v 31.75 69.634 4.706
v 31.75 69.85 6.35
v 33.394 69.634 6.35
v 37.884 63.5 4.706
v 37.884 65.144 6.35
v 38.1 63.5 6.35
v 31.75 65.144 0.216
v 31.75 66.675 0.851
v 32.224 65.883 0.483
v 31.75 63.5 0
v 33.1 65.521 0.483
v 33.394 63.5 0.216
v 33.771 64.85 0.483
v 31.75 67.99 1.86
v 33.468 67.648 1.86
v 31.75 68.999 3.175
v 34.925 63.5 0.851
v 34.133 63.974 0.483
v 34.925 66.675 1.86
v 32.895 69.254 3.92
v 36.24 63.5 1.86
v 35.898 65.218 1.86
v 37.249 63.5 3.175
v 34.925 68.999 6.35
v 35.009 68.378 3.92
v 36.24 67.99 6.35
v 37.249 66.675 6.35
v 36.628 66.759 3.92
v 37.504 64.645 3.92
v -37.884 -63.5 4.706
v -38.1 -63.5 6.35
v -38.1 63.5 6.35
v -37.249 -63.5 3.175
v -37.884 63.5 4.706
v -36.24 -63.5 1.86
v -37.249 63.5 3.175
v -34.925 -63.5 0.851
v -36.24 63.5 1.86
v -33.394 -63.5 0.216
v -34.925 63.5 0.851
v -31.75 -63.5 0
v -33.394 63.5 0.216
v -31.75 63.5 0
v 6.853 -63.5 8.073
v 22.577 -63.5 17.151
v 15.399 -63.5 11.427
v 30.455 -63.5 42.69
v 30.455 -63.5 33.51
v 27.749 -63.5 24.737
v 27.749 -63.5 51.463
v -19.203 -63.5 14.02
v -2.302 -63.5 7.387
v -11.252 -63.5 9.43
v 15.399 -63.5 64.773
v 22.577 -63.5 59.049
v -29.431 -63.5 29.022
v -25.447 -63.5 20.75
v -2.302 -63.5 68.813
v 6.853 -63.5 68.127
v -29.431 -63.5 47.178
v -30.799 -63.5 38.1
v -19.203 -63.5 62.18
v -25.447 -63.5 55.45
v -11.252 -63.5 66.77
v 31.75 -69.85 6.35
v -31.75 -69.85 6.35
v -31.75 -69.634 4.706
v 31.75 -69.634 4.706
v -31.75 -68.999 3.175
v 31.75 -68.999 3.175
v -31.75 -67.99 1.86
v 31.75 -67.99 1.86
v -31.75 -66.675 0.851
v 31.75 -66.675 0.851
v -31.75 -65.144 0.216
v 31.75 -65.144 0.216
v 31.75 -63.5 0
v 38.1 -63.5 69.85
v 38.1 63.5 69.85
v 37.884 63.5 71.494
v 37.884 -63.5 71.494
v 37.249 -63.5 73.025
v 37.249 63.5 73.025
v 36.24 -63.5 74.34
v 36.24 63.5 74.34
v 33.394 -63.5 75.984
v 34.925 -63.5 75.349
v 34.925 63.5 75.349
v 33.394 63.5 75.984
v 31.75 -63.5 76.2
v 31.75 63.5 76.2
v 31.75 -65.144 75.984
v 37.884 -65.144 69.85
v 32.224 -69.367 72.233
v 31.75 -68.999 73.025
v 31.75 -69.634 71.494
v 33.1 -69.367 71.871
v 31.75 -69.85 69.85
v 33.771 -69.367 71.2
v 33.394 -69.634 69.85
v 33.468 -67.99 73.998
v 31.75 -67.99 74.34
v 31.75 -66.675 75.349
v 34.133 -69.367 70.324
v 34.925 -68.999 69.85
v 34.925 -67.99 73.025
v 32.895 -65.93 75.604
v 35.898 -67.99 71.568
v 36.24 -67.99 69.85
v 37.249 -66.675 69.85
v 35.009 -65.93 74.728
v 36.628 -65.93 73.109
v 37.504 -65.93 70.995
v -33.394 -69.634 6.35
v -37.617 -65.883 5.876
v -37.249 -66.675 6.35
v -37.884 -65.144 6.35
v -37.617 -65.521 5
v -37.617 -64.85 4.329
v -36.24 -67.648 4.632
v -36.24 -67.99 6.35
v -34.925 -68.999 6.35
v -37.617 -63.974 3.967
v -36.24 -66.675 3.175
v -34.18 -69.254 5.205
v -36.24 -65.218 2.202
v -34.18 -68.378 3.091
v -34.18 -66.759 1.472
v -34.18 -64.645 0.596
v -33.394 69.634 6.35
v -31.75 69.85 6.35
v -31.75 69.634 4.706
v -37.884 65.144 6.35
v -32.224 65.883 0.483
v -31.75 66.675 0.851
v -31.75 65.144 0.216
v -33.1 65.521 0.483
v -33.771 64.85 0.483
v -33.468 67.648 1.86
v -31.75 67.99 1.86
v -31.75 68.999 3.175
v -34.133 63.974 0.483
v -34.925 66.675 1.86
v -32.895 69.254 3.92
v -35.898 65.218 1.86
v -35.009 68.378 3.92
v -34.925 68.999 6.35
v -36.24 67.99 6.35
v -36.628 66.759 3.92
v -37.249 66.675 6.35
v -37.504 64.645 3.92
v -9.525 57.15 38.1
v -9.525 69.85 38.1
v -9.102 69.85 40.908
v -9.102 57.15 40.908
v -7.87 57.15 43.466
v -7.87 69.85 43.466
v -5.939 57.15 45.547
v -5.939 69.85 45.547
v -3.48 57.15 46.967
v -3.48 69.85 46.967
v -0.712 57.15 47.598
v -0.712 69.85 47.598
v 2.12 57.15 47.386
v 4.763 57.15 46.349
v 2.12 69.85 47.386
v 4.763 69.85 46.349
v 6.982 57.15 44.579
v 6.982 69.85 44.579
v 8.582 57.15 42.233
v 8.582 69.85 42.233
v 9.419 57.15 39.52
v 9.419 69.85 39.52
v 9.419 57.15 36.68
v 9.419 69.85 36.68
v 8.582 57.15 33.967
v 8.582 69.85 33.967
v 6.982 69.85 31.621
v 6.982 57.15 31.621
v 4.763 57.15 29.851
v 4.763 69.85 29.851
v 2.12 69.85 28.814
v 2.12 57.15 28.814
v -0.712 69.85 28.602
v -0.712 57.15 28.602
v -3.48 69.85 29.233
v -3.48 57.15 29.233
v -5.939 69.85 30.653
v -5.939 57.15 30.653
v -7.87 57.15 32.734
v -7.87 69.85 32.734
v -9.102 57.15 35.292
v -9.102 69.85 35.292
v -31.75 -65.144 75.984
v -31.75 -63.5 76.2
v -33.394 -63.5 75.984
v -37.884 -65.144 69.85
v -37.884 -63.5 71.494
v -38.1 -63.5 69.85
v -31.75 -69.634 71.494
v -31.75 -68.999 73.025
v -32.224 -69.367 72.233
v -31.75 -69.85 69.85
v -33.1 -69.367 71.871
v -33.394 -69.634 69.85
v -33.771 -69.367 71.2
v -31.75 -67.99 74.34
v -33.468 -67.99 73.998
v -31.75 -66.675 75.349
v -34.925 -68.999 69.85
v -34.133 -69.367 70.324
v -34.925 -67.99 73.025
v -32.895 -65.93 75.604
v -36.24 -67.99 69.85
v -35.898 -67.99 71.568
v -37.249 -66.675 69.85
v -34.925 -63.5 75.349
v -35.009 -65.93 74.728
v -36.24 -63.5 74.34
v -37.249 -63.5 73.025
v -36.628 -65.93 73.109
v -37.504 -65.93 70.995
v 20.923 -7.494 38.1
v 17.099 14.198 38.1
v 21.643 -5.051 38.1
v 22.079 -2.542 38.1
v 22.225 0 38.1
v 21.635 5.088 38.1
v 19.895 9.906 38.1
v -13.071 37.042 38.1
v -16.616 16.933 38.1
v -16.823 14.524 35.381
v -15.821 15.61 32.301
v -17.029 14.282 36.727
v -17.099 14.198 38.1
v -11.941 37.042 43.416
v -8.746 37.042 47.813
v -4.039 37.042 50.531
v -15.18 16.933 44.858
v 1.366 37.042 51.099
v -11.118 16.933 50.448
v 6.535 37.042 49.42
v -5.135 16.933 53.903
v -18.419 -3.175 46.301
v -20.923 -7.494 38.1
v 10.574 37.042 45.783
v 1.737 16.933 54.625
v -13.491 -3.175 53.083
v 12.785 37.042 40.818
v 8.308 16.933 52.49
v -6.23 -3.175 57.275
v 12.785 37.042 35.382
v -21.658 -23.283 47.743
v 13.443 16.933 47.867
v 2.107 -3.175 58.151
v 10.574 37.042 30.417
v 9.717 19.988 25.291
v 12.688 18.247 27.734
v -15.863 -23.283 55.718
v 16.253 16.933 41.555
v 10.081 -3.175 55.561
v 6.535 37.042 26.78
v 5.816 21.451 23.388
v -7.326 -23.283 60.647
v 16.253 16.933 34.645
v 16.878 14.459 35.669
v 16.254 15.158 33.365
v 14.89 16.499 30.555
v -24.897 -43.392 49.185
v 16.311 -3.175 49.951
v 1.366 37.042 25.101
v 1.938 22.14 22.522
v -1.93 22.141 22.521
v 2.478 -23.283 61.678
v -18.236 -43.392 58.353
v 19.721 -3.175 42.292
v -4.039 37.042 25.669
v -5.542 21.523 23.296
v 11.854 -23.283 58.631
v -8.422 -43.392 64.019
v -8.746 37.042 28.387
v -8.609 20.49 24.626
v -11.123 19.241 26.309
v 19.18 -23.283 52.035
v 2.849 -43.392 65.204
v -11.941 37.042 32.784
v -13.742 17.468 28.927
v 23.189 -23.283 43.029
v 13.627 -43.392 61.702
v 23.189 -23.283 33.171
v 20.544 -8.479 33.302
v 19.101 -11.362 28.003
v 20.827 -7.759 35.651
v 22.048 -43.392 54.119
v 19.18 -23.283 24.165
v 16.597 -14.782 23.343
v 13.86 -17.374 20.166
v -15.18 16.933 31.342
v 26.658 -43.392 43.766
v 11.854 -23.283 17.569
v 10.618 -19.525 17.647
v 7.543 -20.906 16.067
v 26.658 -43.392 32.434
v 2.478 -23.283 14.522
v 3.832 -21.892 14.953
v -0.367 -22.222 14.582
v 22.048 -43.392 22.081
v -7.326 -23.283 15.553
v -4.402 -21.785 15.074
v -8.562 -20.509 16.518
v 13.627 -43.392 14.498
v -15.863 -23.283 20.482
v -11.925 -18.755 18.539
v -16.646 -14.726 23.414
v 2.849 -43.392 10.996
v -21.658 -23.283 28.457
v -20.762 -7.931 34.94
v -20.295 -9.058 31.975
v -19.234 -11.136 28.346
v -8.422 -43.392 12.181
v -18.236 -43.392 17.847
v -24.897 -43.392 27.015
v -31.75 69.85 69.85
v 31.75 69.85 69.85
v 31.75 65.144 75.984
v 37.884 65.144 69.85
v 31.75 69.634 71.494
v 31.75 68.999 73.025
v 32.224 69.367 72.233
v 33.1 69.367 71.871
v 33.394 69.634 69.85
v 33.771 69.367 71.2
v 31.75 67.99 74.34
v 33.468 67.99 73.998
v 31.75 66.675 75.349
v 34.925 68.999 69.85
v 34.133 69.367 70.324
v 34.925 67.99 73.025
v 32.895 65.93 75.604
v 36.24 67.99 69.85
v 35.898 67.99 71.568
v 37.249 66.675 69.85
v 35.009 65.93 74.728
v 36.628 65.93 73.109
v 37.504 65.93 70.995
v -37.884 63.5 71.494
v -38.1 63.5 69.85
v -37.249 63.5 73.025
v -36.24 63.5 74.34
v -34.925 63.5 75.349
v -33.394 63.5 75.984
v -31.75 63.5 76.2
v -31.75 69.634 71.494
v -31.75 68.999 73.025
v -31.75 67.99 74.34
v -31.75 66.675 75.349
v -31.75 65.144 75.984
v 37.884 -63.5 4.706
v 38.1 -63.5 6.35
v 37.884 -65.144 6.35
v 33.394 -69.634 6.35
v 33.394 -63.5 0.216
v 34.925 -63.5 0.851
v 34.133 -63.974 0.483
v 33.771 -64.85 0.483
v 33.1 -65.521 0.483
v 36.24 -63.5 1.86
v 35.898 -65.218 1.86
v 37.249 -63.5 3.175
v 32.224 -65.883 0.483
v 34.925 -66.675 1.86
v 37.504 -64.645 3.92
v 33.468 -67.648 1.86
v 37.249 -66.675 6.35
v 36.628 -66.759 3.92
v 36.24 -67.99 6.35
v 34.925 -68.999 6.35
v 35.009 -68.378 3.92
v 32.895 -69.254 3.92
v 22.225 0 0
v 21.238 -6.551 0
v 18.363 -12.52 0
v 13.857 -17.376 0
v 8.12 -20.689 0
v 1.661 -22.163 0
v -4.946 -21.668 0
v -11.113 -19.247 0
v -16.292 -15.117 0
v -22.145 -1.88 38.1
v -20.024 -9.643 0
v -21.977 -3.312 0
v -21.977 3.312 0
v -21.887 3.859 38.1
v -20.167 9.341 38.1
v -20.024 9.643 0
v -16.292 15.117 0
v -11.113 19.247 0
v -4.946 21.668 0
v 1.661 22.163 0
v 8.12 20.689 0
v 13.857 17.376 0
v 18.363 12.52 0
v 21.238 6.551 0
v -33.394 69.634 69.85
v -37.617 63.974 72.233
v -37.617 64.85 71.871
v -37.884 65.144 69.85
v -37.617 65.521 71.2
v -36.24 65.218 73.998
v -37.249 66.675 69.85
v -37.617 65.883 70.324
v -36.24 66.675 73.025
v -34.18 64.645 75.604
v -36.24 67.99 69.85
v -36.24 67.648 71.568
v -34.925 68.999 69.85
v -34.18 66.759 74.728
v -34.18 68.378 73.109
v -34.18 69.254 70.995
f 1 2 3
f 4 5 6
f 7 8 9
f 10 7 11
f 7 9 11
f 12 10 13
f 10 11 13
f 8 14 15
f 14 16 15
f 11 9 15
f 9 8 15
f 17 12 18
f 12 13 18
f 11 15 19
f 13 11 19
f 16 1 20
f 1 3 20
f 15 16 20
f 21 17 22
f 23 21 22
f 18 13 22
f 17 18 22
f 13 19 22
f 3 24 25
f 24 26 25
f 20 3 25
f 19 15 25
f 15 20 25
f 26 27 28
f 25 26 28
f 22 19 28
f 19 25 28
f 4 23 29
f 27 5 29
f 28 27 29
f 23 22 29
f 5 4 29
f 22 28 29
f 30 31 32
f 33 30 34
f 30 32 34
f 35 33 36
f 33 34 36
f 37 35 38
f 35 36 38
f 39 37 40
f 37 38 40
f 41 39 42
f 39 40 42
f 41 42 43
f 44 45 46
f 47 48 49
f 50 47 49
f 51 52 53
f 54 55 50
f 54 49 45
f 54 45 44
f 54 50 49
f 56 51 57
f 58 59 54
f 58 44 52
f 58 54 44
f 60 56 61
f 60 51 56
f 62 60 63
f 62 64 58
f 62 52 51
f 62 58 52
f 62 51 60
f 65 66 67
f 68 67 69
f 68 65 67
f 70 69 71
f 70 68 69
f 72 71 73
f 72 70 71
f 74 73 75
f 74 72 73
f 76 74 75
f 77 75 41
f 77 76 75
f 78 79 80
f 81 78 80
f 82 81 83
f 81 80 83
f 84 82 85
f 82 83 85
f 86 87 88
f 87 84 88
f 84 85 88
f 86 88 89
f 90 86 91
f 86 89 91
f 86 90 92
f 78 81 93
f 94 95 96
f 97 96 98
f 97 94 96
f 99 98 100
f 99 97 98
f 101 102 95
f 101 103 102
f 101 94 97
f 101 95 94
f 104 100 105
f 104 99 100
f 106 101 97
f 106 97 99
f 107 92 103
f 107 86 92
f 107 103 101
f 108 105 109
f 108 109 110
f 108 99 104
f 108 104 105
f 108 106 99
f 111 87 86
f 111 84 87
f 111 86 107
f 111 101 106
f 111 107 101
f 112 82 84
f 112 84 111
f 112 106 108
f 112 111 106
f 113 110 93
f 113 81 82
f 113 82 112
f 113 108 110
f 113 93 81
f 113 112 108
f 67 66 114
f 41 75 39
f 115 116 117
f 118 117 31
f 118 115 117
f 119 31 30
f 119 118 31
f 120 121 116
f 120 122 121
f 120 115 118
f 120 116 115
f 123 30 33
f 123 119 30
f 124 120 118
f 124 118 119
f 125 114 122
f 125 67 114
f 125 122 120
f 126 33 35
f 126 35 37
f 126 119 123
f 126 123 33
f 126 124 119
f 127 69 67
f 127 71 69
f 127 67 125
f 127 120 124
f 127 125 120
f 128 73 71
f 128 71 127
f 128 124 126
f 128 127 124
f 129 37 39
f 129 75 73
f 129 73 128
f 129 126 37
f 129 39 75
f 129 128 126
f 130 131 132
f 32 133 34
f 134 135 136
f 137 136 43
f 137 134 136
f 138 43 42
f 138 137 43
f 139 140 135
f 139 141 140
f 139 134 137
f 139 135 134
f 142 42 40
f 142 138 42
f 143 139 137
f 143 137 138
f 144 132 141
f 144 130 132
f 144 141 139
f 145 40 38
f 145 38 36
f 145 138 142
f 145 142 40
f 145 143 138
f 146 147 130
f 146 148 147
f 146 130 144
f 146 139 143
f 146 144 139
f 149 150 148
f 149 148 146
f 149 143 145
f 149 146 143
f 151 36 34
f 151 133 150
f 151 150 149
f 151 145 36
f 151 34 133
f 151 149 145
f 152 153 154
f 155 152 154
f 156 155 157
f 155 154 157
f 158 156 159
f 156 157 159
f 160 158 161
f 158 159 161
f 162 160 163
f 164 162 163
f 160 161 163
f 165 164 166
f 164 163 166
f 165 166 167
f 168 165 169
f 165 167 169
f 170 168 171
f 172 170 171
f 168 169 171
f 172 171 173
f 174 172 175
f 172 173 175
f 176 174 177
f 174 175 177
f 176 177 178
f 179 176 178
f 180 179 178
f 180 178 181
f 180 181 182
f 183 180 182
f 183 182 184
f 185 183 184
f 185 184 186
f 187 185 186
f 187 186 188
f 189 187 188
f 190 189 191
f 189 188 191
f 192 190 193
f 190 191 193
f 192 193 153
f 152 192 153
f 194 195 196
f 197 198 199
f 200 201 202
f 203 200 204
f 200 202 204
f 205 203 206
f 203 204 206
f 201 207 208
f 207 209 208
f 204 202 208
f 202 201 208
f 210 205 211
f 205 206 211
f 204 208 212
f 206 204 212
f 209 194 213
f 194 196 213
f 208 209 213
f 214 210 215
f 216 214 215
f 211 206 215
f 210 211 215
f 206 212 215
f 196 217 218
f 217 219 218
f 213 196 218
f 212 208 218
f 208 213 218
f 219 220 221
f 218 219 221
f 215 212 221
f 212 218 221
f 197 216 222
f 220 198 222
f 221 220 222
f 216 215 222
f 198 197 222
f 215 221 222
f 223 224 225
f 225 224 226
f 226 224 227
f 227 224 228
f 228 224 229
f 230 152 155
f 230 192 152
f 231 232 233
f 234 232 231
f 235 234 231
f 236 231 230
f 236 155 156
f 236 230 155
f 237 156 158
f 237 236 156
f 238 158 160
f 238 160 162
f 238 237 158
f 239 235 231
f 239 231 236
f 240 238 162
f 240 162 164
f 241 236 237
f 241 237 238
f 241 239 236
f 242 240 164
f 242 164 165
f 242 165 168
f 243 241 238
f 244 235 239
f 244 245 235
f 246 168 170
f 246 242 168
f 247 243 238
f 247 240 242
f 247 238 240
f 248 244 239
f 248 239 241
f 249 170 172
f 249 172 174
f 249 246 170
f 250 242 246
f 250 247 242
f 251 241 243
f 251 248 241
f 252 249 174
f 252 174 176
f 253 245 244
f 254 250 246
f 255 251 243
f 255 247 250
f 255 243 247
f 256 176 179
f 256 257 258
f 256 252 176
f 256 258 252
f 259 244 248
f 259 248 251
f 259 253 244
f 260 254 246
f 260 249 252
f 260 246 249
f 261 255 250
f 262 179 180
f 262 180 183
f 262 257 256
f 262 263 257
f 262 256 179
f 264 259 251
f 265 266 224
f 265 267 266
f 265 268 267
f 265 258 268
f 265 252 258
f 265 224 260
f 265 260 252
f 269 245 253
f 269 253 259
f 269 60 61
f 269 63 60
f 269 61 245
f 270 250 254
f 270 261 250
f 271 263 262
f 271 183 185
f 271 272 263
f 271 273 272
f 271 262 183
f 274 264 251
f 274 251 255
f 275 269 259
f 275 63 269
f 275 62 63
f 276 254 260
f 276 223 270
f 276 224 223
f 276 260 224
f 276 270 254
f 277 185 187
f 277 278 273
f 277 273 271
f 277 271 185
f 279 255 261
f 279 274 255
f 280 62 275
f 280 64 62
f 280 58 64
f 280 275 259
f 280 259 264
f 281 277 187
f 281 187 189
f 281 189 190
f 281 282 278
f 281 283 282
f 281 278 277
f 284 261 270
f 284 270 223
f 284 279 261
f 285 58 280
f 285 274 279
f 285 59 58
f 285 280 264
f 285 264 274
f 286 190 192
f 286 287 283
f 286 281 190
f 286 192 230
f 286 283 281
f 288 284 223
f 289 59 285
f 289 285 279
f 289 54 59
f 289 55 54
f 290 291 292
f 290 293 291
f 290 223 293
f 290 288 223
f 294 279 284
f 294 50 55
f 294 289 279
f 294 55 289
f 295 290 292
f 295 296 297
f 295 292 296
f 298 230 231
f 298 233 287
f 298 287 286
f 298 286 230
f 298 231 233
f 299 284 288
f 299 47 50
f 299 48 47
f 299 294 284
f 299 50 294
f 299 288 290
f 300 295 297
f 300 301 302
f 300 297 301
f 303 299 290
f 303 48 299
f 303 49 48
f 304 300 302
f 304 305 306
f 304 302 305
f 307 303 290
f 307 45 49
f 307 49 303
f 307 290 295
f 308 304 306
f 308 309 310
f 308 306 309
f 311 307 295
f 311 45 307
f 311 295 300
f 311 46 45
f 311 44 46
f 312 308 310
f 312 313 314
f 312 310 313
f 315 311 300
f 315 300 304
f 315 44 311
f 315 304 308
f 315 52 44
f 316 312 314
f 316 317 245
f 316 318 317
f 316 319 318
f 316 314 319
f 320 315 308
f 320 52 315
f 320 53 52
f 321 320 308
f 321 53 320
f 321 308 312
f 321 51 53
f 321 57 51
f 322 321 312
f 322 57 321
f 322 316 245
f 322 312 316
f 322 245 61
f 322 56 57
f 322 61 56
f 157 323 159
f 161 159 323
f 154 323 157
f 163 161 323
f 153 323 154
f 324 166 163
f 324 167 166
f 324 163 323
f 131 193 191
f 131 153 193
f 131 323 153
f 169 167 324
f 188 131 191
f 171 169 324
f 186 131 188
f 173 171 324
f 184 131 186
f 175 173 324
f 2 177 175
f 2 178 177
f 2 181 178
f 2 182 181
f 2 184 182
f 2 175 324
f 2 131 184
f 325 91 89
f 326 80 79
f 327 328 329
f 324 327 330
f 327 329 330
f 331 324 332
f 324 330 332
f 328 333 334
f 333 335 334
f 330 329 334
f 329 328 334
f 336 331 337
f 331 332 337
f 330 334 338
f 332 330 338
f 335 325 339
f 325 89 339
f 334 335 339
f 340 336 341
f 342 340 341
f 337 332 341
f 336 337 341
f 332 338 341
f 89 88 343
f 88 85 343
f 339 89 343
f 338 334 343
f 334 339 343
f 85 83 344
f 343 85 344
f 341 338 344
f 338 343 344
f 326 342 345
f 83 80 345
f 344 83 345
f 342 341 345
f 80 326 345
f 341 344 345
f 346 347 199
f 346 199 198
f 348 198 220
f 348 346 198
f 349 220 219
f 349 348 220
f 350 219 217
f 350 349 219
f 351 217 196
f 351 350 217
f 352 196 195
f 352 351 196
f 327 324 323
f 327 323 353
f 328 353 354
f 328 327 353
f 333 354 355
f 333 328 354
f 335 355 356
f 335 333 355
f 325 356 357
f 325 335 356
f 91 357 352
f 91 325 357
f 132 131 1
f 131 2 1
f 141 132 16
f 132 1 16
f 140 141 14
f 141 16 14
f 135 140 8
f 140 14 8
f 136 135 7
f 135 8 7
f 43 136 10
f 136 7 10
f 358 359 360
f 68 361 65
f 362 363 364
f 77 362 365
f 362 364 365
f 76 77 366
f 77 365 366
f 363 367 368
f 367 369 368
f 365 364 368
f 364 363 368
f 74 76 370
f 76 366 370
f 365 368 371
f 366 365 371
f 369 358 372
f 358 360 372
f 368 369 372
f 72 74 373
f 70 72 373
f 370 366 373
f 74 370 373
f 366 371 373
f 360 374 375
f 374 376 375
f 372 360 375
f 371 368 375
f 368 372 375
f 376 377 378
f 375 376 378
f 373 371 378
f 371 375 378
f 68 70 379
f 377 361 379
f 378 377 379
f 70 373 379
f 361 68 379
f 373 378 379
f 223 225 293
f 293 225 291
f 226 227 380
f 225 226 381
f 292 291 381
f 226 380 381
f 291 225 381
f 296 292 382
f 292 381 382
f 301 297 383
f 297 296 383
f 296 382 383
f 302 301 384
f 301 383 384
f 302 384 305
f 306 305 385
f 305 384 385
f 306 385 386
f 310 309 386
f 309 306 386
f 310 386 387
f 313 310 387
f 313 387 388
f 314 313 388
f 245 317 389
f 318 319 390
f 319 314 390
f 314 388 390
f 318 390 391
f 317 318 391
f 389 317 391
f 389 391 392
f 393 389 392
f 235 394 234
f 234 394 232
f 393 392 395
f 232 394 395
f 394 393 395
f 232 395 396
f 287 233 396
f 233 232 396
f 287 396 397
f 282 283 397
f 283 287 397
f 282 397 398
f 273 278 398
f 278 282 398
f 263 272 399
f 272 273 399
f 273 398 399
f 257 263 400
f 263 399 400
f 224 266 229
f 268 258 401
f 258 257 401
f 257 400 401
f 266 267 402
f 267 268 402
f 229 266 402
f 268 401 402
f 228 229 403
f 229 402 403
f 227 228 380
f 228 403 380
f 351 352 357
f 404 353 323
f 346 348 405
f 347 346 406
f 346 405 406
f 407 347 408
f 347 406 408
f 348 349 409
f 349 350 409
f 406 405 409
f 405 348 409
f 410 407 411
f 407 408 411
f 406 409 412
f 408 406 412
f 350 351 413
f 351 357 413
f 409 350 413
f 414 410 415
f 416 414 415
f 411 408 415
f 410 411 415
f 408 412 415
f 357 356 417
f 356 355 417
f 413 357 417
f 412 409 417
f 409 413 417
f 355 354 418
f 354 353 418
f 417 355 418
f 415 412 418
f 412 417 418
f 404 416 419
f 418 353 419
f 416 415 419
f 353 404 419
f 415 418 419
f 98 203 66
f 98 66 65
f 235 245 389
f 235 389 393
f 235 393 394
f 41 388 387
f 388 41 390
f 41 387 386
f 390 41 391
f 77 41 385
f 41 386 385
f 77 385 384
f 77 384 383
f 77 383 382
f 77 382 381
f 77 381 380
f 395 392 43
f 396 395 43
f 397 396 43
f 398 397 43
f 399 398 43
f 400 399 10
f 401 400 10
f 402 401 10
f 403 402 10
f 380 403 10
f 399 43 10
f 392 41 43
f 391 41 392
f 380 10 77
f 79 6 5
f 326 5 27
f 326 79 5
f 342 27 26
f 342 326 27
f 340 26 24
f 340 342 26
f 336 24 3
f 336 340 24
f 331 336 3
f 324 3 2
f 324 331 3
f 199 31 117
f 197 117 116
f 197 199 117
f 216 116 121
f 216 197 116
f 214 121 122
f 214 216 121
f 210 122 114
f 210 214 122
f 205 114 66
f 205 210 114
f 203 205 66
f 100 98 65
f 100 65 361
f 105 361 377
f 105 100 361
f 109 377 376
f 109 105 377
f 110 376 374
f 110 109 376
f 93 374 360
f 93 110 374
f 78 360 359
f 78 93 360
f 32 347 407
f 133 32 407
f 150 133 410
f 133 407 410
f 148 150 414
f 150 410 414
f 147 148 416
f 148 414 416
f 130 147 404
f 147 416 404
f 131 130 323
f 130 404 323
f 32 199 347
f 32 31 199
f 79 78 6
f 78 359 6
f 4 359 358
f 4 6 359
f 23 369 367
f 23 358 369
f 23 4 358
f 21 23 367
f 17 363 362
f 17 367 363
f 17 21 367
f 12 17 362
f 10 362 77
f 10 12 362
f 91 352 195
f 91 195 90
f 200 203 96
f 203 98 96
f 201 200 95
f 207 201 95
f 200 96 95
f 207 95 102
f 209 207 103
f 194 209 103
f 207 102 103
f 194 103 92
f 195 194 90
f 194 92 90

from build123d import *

# Parameters (mm, degrees)
F0_W      = 76.2
F0_H      = 139.7
F1_DEPTH  = 76.2
F3_R      = 6.35
F2_R      = 22.225
F4_DEPTH  = 12.7
F6_R      = 9.525
F7_DEPTH  = 12.7
F8_R      = 9.525
F9_DEPTH  = 120.65
F9_TAPER  = -10
F5_R      = 22.225
F10_DEPTH = 25.4


with BuildPart() as f1:
    # F0 (on Top) → F1 (new body)
    with BuildSketch(Plane.XY):
        Rectangle(F0_W, F0_H)
    extrude(amount=F1_DEPTH)

    # F3
    f3_edges = [f1.edges().sort_by_distance(p)[0] for p in [
        (38.1, 0, 76.2),
        (0, 69.85, 76.2),
        (-38.1, 0, 76.2),
        (0, -69.85, 76.2),
        (38.1, 69.85, 38.1),
        (-38.1, 69.85, 38.1),
        (0, 69.85, 0),
        (38.1, -69.85, 38.1),
        (38.1, 0, 0),
        (0, -69.85, 0),
        (-38.1, -69.85, 38.1),
        (-38.1, 0, 0),
    ]]
    fillet(f3_edges, radius=F3_R)

    # F2 (on face) → F4 (cut)
    with BuildSketch(Plane(origin=(0, 0, 0), x_dir=(1, 0, 0), z_dir=(0, 0, -1))):
        Circle(F2_R)
    extrude(amount=-F4_DEPTH, mode=Mode.SUBTRACT)

    # F6 (on face) → F7 (cut)
    with BuildSketch(Plane(origin=(0, 69.85, 0), x_dir=(-1, 0, 0), z_dir=(0, 1, 0))):
        with Locations((0, 38.1)):
            Circle(F6_R)
    extrude(amount=-F7_DEPTH, mode=Mode.SUBTRACT)

    # F8 (on face) → F9 (cut)
    with BuildSketch(Plane(origin=(0, 57.15, 0), x_dir=(-1, 0, 0), z_dir=(0, 1, 0))):
        with Locations((0, 38.1)):
            Circle(F8_R)
    extrude(amount=-F9_DEPTH, taper=F9_TAPER, mode=Mode.SUBTRACT)

    # F5 (on face) → F10 (cut)
    with BuildSketch(Plane(origin=(0, 0, 12.7), x_dir=(1, 0, 0), z_dir=(0, 0, -1))):
        Circle(F5_R)
    extrude(amount=-F10_DEPTH, mode=Mode.SUBTRACT)


solid = f1.part
